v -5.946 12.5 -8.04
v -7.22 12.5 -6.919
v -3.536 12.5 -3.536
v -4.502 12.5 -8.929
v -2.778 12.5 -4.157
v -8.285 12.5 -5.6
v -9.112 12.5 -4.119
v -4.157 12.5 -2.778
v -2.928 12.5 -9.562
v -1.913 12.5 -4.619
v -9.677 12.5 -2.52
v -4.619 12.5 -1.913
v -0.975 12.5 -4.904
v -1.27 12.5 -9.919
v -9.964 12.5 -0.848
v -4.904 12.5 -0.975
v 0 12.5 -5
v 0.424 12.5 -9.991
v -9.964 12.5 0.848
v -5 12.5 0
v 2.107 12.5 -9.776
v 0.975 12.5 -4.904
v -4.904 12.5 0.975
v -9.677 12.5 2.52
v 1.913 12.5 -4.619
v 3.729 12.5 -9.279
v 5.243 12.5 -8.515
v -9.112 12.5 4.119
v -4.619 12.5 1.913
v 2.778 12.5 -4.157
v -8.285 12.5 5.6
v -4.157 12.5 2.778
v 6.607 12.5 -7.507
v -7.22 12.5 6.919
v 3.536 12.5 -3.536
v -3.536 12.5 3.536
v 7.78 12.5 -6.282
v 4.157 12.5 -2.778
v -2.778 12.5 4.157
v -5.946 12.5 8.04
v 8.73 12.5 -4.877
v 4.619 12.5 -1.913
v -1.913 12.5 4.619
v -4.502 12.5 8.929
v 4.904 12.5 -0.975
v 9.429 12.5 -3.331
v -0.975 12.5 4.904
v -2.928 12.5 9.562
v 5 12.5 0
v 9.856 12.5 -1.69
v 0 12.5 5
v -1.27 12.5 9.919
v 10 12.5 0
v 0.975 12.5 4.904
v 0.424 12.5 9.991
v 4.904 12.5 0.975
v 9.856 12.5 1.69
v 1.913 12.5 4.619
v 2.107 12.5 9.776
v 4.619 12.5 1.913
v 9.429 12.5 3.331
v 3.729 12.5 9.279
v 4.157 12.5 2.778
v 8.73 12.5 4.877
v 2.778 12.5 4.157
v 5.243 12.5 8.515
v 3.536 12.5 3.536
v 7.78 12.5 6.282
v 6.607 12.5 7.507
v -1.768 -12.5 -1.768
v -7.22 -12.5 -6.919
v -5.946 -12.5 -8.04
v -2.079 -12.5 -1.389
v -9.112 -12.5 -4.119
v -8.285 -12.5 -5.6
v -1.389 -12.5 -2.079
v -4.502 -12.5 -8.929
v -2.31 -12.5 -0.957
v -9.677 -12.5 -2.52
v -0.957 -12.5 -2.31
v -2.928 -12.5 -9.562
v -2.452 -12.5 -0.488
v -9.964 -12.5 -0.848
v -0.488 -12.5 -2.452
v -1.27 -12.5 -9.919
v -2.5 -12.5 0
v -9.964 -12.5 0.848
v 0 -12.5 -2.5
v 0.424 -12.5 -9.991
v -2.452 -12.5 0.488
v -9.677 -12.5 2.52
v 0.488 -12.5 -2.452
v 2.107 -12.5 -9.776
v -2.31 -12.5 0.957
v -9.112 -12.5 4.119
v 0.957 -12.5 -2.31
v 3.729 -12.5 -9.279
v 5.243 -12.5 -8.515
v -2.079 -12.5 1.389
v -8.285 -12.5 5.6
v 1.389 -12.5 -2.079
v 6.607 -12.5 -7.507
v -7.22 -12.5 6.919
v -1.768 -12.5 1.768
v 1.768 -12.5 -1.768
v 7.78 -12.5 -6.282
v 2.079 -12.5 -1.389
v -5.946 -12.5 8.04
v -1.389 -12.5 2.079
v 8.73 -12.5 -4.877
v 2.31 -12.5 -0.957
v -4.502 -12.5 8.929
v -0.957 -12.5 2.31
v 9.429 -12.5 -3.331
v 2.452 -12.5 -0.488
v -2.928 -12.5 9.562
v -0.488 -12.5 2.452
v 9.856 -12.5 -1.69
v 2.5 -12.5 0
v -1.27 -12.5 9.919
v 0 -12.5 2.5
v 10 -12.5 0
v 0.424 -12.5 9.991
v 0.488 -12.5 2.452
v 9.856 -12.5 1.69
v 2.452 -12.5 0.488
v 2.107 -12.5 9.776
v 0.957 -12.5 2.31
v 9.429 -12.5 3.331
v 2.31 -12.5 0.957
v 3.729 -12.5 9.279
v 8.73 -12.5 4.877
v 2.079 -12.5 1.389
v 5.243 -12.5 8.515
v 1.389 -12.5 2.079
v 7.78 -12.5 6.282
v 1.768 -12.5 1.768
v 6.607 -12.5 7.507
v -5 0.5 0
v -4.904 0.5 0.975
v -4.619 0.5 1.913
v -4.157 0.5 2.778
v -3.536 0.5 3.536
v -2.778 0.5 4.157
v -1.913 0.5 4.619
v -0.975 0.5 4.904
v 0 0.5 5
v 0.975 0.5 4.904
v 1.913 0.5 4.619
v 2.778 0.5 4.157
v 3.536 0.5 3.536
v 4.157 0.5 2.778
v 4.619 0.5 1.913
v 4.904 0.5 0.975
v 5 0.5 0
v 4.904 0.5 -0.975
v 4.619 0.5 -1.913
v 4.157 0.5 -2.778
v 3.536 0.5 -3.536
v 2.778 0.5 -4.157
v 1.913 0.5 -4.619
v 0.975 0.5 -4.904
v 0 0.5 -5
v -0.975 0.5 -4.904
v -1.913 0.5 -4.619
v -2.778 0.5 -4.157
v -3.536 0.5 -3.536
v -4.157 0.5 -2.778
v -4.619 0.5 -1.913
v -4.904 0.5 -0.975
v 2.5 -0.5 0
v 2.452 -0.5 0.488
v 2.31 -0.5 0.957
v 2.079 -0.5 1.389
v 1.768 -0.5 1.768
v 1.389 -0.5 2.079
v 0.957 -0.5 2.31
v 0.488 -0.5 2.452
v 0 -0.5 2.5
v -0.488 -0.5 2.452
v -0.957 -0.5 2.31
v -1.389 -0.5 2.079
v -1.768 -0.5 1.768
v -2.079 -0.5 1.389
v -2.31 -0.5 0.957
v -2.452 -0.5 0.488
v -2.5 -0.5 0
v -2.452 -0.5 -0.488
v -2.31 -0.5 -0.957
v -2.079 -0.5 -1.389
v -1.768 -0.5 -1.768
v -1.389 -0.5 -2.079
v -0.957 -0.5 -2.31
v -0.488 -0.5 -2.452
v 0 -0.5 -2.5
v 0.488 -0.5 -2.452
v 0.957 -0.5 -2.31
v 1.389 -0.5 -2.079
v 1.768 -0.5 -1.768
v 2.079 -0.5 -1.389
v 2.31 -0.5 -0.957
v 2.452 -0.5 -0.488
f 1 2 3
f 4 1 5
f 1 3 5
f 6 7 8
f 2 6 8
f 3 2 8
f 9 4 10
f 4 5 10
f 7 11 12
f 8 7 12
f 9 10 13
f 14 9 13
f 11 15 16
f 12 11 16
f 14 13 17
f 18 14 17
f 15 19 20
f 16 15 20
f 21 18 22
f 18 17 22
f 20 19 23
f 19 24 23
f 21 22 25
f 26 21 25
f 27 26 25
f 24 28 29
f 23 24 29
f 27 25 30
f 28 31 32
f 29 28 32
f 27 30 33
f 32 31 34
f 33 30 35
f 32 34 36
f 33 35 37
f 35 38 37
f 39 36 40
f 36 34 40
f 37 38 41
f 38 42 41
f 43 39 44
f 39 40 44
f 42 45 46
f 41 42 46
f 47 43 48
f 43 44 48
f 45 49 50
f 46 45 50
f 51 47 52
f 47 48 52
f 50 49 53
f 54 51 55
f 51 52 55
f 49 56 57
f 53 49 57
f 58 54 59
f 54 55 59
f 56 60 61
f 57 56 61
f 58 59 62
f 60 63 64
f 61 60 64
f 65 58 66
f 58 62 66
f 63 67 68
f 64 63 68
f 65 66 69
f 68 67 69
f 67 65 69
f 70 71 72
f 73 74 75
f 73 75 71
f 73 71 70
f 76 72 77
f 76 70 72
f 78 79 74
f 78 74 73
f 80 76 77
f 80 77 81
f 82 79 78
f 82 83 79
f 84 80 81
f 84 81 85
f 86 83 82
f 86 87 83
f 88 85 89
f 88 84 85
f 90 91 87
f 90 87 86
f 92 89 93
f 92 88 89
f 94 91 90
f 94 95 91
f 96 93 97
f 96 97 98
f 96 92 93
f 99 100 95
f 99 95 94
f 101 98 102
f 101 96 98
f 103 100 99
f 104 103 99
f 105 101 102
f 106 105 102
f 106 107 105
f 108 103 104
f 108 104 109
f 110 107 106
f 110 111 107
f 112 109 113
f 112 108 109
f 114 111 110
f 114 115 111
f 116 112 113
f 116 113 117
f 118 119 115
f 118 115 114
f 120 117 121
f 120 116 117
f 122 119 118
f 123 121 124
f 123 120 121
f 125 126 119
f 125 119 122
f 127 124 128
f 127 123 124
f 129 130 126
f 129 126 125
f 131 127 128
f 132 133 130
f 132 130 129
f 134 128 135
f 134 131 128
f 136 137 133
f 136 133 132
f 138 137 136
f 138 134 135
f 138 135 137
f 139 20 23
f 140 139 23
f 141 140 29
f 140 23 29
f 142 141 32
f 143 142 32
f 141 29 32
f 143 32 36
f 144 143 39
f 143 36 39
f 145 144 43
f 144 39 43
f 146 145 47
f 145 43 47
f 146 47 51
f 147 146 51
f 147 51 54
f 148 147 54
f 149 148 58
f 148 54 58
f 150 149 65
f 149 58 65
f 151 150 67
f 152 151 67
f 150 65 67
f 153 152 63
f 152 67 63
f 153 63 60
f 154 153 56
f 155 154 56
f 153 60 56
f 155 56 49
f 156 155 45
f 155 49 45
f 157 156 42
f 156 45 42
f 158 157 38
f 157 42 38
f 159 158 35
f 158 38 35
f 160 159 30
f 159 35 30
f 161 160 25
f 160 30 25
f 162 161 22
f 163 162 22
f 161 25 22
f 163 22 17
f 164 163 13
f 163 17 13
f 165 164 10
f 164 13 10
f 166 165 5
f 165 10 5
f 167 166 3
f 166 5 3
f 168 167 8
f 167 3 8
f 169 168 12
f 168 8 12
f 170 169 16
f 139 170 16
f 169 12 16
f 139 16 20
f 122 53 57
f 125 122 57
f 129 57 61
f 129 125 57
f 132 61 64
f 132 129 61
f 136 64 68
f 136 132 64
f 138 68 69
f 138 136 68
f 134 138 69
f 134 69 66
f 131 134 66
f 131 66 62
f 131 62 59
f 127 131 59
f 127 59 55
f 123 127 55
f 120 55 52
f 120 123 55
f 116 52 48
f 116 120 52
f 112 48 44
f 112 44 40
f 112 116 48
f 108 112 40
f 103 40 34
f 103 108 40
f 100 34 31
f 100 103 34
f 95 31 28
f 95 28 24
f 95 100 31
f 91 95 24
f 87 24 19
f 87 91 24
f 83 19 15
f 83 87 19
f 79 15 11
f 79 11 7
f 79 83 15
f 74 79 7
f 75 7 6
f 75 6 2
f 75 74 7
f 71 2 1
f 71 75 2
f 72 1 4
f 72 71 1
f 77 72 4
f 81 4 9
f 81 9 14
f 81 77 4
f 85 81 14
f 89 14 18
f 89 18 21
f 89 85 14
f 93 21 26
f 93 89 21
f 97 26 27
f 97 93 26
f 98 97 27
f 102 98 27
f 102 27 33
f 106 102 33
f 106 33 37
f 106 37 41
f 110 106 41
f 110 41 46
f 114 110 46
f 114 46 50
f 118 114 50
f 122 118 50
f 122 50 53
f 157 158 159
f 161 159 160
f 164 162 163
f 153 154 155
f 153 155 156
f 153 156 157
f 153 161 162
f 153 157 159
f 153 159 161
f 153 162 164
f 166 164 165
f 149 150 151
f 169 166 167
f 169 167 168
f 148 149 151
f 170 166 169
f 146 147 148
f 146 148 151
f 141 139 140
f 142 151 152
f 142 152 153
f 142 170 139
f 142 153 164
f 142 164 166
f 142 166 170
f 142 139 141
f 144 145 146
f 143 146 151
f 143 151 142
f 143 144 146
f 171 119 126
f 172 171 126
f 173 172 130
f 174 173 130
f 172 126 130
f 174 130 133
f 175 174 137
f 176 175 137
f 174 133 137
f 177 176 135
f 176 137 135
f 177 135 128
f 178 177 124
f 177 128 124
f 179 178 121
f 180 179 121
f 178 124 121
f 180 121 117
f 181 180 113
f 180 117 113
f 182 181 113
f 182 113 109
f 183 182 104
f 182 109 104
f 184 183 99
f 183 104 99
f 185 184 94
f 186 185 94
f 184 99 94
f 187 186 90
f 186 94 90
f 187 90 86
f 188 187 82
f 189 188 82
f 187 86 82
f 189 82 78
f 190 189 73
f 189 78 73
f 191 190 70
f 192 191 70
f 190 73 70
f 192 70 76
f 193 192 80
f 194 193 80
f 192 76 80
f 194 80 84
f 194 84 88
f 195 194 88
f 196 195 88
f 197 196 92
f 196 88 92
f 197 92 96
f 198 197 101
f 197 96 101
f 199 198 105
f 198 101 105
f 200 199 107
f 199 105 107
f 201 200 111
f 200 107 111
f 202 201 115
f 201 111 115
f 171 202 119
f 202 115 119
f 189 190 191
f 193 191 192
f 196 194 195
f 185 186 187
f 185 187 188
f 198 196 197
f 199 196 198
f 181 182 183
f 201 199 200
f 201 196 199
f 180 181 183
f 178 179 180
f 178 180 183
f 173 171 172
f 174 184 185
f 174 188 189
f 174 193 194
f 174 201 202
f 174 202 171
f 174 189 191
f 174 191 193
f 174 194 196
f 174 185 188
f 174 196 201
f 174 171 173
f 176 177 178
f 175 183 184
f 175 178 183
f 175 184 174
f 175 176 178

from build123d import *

# Parameters (mm, degrees)
F0_R     = 10
F1_DEPTH = 12.5
F2_R     = 2.5
F3_DEPTH = 12
F4_R     = 5
F5_DEPTH = 12


with BuildPart() as f1:
    # F0 (on Front) → F1 (new body, symmetric)
    with BuildSketch(Plane.XZ):
        Circle(F0_R)
    extrude(amount=F1_DEPTH, both=True)

    # F2 (on face) → F3 (cut)
    with BuildSketch(Plane.XZ.offset(12.5)):
        Circle(F2_R)
    extrude(amount=-F3_DEPTH, mode=Mode.SUBTRACT)

    # F4 (on face) → F5 (cut)
    with BuildSketch(Plane(origin=(0, 12.5, 0), x_dir=(-1, 0, 0), z_dir=(0, 1, 0))):
        Circle(F4_R)
    extrude(amount=-F5_DEPTH, mode=Mode.SUBTRACT)


solid = f1.part
